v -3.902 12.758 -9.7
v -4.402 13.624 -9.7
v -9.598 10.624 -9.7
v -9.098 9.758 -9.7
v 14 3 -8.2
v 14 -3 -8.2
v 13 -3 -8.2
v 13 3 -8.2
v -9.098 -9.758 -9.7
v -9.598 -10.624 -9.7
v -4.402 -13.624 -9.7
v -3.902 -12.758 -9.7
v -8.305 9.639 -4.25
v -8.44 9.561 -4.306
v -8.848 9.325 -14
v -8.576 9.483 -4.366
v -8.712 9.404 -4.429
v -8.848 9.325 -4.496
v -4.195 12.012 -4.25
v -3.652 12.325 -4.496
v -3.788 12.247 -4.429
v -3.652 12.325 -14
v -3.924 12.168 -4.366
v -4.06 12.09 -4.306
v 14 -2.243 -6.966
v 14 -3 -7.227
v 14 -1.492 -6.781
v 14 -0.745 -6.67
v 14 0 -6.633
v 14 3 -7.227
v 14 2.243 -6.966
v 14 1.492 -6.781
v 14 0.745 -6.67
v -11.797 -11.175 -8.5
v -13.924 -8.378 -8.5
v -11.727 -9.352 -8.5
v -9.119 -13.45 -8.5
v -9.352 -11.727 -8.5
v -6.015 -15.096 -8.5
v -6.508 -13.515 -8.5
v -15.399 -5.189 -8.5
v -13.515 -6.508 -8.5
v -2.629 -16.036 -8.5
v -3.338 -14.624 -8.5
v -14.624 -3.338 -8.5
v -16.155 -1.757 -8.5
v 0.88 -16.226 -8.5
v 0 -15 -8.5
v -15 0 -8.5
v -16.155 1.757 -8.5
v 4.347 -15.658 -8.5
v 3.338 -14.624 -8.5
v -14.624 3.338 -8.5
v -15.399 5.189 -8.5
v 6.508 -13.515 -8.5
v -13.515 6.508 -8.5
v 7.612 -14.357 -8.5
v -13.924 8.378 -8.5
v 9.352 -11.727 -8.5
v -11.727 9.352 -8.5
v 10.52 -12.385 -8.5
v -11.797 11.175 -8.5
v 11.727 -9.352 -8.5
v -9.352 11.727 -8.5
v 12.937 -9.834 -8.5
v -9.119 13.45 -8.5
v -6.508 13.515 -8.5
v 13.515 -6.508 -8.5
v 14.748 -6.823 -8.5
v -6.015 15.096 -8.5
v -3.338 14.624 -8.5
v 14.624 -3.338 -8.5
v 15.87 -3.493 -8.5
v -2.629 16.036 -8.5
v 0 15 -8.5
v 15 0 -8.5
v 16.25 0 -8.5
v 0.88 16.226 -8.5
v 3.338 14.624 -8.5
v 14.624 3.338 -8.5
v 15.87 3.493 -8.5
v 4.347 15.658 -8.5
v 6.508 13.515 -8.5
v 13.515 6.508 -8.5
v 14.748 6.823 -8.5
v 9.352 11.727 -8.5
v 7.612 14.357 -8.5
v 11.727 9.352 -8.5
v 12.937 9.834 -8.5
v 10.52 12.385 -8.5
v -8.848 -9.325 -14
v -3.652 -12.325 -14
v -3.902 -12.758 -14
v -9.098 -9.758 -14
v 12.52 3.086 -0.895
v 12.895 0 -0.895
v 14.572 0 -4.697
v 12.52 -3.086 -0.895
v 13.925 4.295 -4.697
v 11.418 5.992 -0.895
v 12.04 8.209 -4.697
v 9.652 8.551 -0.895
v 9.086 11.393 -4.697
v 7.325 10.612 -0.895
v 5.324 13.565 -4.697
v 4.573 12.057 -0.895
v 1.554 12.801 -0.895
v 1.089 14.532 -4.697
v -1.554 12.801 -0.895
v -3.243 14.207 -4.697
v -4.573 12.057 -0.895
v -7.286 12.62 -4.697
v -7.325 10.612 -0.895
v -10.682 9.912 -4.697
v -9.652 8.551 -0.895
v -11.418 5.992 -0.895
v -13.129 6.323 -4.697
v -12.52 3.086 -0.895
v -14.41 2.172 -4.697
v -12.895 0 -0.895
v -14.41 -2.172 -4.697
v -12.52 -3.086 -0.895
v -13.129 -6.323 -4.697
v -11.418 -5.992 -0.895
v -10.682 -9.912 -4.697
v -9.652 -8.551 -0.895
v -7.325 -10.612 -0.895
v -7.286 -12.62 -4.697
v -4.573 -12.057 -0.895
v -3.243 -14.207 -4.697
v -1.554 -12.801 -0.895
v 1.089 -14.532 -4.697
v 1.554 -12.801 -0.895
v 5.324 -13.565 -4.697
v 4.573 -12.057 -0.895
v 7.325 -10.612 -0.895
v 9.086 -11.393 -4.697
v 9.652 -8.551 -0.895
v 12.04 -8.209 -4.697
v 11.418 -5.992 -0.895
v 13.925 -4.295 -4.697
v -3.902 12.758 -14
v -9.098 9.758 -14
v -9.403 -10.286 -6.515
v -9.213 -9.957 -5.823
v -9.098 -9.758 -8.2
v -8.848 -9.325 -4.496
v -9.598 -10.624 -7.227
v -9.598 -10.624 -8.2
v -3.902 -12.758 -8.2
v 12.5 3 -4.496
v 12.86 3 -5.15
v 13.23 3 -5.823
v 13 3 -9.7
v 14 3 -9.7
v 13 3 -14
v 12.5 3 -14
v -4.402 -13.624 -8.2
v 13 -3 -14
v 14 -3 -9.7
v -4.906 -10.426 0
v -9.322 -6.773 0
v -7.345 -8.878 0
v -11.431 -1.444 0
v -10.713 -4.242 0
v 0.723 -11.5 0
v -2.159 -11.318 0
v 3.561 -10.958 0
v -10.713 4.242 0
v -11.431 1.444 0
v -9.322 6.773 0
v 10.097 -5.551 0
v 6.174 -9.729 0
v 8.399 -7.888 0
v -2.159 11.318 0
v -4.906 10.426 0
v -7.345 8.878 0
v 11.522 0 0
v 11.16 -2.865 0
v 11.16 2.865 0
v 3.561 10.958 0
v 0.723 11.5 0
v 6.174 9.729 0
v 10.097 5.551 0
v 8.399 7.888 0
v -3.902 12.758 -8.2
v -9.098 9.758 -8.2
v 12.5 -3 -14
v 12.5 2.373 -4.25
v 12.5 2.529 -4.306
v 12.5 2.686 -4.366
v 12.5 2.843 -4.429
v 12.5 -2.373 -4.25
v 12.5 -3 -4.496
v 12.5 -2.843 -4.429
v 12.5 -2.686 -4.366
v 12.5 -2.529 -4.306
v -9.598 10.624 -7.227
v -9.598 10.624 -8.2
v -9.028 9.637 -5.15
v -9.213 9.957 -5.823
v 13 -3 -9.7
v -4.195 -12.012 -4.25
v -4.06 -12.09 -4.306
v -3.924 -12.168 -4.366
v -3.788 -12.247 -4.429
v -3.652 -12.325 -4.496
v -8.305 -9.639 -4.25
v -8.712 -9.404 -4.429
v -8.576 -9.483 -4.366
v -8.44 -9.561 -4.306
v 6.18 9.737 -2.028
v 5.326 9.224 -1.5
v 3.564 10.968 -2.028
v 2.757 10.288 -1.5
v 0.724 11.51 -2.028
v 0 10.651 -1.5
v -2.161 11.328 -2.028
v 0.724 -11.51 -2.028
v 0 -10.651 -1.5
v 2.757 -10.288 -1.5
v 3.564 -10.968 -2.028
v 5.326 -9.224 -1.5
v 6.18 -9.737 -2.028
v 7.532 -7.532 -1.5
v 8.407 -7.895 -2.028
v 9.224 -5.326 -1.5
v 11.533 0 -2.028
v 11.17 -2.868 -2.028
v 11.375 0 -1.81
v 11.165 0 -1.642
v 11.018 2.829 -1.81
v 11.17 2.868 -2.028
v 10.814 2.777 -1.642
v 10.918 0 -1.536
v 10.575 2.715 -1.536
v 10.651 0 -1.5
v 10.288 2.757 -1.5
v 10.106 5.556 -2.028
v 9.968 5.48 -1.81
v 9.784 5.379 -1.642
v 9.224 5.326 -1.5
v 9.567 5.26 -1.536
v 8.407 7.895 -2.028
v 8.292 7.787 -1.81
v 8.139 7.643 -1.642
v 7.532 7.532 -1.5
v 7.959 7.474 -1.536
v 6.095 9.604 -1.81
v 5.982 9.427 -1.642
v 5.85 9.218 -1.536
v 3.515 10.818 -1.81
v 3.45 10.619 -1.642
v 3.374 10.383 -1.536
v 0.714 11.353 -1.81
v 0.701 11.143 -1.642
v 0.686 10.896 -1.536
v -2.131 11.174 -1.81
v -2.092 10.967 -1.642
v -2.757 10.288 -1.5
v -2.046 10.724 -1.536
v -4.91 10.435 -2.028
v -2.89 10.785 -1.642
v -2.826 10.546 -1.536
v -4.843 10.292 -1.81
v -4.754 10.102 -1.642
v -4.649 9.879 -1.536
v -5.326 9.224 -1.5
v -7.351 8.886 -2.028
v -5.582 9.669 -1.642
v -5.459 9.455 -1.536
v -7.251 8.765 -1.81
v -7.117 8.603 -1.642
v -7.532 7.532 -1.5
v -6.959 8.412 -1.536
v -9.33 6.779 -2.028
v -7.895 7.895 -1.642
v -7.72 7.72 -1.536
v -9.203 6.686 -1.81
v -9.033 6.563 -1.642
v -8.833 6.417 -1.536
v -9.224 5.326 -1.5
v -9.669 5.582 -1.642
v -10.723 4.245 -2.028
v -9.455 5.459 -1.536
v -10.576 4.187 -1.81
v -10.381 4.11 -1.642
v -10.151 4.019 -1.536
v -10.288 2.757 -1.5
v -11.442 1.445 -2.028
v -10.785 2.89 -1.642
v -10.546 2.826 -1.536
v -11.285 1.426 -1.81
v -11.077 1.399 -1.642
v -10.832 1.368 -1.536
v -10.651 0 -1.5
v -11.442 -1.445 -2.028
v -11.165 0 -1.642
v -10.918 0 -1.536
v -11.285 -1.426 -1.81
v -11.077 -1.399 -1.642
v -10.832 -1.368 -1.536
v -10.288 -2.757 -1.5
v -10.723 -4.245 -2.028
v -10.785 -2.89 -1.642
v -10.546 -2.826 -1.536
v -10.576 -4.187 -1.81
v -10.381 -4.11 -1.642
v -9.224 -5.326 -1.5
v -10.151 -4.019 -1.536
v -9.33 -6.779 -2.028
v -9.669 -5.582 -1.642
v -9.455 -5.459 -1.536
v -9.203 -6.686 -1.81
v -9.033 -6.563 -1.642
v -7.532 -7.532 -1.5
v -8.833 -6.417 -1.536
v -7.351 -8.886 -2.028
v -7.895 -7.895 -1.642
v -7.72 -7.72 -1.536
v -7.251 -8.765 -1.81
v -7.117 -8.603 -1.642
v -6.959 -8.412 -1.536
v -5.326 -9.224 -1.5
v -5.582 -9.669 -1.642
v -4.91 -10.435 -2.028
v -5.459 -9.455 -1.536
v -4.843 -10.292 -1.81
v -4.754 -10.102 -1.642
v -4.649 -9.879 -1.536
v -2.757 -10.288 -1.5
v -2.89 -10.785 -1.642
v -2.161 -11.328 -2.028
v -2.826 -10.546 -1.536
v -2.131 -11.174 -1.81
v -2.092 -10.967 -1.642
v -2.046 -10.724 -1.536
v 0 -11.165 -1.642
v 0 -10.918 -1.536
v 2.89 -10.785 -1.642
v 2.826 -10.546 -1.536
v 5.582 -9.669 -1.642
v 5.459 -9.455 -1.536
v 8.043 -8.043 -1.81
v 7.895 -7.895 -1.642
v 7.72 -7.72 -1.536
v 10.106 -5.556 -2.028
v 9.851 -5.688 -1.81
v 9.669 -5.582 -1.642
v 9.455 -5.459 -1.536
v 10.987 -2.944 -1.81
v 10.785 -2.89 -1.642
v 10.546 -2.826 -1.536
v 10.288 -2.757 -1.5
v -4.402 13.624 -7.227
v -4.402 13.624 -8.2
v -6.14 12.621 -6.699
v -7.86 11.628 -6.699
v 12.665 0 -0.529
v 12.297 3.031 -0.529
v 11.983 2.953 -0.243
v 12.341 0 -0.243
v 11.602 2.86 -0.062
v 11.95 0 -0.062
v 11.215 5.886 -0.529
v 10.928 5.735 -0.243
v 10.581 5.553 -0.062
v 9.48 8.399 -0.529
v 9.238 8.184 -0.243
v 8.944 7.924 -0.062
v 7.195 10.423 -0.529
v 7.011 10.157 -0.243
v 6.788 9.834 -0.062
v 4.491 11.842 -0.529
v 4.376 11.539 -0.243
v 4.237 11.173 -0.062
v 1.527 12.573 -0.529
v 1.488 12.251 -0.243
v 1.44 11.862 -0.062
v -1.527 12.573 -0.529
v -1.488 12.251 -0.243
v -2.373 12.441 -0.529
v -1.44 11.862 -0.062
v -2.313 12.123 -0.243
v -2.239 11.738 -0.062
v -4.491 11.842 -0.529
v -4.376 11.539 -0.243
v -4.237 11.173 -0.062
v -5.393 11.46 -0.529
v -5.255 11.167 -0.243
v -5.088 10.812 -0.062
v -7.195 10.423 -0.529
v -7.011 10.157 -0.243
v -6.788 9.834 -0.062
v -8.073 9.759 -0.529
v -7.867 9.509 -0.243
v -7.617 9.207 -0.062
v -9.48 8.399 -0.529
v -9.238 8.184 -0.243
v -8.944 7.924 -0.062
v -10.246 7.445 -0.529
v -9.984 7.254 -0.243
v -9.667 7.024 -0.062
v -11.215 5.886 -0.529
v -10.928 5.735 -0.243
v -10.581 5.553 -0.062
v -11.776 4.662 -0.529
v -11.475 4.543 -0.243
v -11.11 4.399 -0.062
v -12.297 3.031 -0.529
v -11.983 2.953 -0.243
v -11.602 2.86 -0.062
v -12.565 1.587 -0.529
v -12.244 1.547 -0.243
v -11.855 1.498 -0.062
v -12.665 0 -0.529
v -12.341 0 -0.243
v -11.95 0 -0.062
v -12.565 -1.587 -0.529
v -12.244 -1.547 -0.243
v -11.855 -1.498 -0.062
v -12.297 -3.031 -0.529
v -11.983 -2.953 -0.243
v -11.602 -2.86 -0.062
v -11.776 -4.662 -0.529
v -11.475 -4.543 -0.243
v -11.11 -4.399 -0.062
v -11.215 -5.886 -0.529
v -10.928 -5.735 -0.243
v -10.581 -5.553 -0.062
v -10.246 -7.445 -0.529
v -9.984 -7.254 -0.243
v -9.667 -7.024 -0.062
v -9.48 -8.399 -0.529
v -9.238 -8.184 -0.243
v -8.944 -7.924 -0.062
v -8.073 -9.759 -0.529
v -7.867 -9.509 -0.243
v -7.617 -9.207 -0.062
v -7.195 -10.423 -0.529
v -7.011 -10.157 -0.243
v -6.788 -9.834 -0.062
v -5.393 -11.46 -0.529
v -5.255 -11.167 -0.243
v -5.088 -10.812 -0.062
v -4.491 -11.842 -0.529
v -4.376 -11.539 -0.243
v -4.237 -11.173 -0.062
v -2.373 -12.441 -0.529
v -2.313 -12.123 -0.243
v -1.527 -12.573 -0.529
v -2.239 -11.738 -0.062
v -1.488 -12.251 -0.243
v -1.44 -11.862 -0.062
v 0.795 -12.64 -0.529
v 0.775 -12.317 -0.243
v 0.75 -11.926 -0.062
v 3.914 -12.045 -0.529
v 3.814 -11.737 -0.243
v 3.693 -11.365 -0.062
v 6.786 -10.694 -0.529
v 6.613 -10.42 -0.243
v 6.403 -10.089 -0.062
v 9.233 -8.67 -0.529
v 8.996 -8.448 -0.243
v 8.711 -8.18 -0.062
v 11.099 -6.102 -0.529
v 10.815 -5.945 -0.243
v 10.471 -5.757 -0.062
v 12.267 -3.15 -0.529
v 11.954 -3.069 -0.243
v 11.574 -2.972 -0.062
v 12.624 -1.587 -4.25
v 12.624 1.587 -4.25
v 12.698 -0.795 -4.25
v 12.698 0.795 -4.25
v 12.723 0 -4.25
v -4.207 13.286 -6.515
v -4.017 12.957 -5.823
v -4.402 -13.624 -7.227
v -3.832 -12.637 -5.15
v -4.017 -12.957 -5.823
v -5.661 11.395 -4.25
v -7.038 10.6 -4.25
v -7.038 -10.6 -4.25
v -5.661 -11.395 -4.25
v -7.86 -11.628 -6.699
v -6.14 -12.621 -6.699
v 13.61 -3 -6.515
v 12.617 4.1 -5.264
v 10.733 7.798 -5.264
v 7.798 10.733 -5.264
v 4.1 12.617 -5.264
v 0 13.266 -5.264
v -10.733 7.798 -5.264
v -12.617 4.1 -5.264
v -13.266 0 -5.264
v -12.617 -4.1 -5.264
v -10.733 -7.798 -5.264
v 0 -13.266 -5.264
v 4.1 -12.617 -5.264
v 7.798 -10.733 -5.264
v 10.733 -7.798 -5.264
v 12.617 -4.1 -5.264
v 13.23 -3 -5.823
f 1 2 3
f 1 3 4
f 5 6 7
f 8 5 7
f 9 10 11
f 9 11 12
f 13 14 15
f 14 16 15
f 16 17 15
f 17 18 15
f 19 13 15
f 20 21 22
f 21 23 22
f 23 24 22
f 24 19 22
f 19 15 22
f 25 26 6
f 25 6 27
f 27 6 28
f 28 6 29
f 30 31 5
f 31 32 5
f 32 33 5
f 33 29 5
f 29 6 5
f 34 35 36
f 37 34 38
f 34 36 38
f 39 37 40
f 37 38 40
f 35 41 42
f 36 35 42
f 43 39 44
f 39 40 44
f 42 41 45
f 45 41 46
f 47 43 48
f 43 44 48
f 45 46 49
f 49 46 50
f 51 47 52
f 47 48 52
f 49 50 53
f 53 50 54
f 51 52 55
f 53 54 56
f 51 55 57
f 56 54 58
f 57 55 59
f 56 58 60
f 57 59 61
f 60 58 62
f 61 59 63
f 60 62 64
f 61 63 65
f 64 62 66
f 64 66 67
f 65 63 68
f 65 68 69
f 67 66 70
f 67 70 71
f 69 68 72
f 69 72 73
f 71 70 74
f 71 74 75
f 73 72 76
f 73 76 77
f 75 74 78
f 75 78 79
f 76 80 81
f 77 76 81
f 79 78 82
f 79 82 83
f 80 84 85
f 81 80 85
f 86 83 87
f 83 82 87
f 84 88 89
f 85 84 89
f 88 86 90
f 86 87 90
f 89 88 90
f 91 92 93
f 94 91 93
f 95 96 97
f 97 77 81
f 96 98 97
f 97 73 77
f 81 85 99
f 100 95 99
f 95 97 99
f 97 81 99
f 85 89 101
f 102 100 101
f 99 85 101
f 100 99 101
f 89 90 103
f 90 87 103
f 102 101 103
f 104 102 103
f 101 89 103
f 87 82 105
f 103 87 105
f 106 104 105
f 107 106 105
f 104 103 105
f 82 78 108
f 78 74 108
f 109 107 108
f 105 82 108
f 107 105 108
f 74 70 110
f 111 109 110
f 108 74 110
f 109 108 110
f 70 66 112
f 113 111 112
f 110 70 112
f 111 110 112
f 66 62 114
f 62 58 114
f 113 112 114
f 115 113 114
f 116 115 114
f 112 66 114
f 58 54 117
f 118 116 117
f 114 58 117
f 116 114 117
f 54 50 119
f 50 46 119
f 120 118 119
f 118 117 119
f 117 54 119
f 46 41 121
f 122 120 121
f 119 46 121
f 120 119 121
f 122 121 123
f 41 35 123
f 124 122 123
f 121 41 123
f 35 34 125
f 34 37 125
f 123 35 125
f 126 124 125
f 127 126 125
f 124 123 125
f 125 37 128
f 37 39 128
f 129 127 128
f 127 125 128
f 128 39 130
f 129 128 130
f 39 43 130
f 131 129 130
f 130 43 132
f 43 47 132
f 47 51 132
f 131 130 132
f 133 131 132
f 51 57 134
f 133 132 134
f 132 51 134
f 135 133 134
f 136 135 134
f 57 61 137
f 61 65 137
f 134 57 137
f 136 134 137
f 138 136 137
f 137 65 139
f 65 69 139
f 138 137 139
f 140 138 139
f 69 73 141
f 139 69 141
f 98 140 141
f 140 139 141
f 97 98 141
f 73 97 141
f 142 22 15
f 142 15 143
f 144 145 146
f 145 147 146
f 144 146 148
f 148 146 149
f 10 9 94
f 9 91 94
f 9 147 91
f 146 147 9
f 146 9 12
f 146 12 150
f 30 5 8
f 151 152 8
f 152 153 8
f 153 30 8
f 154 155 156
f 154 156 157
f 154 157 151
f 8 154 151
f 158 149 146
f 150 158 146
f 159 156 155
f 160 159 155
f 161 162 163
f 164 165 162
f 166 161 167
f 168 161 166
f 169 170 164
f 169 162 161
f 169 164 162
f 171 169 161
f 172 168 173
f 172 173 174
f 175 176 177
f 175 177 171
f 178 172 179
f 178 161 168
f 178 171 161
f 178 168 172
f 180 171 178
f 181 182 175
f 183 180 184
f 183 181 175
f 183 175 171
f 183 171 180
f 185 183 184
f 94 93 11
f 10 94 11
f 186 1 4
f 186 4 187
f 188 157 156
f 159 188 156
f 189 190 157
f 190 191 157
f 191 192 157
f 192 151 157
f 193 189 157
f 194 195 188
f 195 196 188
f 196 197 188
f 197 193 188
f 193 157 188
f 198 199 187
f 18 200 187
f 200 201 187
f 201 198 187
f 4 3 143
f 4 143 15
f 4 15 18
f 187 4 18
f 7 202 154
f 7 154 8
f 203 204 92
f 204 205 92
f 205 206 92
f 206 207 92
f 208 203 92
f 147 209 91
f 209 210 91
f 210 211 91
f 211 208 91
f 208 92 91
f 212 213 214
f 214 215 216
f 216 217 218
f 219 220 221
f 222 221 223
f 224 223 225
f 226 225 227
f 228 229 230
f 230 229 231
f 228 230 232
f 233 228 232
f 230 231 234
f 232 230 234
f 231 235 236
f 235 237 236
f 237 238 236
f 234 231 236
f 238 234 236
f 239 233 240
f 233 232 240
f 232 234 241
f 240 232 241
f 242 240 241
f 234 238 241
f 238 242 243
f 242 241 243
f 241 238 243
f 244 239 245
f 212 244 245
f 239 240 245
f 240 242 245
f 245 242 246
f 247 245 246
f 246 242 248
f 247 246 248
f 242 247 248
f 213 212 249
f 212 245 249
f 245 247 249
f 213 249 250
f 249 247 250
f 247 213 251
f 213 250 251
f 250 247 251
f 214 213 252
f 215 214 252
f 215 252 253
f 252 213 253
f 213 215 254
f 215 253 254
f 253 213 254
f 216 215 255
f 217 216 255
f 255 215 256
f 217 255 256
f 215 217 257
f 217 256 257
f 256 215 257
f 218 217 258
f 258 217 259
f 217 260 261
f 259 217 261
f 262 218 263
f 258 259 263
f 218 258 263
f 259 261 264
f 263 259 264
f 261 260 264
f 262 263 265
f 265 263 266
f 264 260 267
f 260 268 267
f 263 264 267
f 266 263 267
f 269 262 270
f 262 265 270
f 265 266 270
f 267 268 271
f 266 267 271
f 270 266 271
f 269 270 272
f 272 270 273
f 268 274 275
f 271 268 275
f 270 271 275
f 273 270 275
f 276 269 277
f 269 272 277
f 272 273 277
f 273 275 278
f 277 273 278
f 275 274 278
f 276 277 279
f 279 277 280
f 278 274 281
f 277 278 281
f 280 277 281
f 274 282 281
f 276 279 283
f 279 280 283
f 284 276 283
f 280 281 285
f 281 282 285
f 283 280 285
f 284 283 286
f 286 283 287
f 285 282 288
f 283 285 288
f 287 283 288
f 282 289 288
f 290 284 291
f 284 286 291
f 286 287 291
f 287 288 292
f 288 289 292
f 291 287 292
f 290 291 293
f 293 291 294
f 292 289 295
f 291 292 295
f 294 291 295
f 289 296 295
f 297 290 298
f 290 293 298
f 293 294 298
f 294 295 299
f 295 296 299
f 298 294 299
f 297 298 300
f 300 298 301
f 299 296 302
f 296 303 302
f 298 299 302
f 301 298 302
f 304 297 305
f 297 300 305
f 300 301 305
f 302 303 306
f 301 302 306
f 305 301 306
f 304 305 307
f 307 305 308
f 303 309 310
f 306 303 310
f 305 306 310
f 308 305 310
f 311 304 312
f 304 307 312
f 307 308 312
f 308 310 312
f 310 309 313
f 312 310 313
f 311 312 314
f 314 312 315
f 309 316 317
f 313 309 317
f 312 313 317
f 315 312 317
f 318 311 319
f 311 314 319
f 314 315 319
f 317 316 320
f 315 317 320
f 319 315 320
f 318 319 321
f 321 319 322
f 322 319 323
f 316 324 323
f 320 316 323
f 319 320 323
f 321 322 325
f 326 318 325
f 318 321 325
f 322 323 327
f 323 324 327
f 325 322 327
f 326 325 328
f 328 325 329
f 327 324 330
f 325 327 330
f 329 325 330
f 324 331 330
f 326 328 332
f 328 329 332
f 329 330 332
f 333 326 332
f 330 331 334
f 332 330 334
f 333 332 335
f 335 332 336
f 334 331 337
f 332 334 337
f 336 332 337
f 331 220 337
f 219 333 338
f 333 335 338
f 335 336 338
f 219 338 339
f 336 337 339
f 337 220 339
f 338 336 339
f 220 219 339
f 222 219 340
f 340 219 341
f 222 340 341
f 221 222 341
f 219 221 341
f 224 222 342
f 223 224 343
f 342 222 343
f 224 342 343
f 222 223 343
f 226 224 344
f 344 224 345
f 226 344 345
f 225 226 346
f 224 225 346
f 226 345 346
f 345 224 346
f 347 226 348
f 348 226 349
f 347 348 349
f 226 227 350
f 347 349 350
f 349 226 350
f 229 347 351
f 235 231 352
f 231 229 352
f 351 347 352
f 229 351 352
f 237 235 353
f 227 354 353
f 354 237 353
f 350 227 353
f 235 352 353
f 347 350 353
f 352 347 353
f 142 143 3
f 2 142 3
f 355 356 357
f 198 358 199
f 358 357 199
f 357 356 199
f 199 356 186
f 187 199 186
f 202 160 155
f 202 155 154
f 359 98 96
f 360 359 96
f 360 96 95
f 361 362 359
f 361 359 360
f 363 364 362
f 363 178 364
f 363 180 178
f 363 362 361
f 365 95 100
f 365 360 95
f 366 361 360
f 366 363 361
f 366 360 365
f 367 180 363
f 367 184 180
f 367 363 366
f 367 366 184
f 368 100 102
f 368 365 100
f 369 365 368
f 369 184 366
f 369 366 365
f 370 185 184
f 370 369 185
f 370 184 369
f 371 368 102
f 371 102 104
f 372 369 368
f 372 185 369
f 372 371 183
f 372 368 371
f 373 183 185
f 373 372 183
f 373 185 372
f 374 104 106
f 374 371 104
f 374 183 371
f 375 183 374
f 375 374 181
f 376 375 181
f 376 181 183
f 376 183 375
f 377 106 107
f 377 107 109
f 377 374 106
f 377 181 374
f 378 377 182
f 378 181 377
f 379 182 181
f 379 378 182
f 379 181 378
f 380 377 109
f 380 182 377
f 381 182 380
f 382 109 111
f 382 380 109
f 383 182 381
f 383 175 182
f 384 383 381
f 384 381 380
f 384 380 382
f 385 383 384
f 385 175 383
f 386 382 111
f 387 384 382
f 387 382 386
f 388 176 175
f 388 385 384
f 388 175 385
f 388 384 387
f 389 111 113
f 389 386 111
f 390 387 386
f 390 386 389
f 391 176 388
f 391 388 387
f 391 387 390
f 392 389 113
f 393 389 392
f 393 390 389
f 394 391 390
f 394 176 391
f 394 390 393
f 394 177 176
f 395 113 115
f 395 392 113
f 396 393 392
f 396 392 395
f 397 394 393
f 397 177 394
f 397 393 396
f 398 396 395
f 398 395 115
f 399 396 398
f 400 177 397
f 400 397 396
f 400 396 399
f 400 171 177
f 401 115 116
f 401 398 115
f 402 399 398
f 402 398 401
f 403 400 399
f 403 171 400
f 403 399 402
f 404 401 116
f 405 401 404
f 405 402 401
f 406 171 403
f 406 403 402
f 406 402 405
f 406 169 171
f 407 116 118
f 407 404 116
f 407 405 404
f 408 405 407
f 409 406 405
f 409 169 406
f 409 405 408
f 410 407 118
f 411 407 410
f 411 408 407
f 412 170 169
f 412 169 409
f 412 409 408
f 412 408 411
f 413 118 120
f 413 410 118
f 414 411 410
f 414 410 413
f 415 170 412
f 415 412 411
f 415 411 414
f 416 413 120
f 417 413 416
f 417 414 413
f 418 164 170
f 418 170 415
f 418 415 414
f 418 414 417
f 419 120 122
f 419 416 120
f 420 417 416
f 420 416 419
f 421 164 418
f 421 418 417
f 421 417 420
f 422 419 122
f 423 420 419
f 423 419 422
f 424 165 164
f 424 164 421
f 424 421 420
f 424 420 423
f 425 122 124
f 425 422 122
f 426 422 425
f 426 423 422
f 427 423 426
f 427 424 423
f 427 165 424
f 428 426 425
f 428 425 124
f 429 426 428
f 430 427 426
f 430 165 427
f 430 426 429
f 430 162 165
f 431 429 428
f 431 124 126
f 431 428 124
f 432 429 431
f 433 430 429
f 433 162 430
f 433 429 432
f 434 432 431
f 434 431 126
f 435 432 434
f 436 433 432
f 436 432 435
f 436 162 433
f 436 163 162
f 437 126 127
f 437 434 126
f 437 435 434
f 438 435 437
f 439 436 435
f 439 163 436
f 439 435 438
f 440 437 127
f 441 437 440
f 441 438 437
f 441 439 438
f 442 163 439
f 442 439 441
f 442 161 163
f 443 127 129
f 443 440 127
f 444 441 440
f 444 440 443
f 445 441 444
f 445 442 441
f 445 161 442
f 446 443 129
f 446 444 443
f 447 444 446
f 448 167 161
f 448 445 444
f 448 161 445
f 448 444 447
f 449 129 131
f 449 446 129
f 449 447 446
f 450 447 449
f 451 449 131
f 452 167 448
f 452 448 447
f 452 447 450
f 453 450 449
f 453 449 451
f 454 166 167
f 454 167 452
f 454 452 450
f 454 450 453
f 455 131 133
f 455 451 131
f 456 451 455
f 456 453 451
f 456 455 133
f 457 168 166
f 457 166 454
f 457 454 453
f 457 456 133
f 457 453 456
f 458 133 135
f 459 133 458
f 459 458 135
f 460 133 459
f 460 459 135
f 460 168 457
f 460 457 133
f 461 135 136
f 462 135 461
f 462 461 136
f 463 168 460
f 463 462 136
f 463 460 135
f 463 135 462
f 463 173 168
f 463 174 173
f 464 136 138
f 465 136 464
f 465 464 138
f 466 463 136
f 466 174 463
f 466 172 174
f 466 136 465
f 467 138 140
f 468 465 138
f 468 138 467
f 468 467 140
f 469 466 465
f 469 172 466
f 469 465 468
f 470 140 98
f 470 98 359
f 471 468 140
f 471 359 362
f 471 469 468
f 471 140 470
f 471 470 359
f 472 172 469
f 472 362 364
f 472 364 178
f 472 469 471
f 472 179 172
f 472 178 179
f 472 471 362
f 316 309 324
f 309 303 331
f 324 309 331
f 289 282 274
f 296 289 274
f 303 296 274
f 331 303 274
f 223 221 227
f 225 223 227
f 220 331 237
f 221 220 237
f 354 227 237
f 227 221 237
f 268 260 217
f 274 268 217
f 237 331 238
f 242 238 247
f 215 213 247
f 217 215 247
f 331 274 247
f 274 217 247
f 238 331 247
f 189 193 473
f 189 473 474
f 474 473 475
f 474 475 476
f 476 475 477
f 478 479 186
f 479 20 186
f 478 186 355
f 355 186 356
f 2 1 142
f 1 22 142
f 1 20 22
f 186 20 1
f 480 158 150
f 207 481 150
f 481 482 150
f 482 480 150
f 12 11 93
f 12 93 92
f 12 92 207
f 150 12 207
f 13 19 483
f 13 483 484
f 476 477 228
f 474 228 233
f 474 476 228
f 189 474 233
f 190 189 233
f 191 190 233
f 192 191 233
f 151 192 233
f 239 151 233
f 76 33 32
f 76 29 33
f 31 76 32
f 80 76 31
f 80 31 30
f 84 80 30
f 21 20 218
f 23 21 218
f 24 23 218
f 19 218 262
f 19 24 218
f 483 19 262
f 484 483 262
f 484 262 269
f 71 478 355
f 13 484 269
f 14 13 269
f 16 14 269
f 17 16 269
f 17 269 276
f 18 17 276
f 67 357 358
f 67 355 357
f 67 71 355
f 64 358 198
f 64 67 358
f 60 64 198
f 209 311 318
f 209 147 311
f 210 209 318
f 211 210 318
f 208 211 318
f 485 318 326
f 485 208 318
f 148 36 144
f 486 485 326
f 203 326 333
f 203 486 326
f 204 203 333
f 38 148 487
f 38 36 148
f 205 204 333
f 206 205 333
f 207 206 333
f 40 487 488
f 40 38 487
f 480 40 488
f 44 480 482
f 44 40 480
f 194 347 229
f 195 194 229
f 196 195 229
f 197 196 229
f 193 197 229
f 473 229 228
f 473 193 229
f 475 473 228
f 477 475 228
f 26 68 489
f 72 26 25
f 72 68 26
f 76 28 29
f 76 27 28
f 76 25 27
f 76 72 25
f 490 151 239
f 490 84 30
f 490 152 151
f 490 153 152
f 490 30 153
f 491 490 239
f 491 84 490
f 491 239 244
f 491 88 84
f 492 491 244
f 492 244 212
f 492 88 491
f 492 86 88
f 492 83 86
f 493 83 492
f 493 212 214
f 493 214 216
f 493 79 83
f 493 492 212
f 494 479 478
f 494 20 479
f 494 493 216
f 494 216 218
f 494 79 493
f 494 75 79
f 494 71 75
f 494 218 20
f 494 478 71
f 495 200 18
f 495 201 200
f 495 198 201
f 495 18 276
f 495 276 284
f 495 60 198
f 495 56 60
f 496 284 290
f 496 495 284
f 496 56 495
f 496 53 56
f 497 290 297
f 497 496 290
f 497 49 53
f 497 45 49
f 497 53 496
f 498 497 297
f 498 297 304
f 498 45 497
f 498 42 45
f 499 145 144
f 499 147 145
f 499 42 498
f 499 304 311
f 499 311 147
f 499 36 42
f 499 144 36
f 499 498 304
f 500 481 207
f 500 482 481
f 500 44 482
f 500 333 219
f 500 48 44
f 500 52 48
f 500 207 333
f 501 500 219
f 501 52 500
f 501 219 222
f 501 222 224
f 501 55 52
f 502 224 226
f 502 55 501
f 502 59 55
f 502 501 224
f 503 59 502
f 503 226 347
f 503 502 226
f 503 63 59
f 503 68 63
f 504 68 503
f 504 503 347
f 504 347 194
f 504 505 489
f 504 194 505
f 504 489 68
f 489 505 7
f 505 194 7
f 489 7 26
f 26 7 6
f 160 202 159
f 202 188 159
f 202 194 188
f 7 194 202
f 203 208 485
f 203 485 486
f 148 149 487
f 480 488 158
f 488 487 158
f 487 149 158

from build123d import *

# Parameters (mm, degrees)
TOP_R              = 12.5
MIDDLE_R           = 16.25
INSIDE_TOP_R       = 11.25
INSIDE_BOTTOM_R    = 15
ZAOKR_GLENIE1_R    = 1
ZAOKR_GLENIE2_R    = 1.5
LATCH_START        = -9
LATCH_DEPTH        = 9.75
LATCH_CUTOUT_DEPTH = 6
SZYK_KO_OWY2_COUNT = 3


with BuildPart() as part:
    # top → outside section 0
    with BuildSketch(Plane.XY):
        Circle(TOP_R)
    # middle → outside section 1
    with BuildSketch(Plane.XY.offset(-8.5)):
        Circle(MIDDLE_R)
    loft()

    # inside-top → inside-cutout section 0
    with BuildSketch(Plane.XY.offset(-1.5)):
        Circle(INSIDE_TOP_R)
    # inside-bottom → inside-cutout section 1
    with BuildSketch(Plane.XY.offset(-8.5)):
        Circle(INSIDE_BOTTOM_R)
    loft(mode=Mode.SUBTRACT)

    # Zaokrąglenie1
    zaokr_glenie1_edges = [part.edges().sort_by_distance(p)[0] for p in [
        (-11.25, 0, -1.5),
    ]]
    fillet(zaokr_glenie1_edges, radius=ZAOKR_GLENIE1_R)

    # Zaokrąglenie2
    zaokr_glenie2_edges = [part.edges().sort_by_distance(p)[0] for p in [
        (-12.5, 0, 0),
    ]]
    fillet(zaokr_glenie2_edges, radius=ZAOKR_GLENIE2_R)

    # Szkic6 → latch (add)
    with BuildSketch(Plane.XY.offset(-5).offset(LATCH_START)):
        Polygon((12.5, 0), (12.5, -3), (14, -3), (14, 3), (12.5, 3), align=None)
    latch = extrude(amount=LATCH_DEPTH)

    # Szkic → latch-cutout (cut)
    with BuildSketch(Plane(origin=(0, -3, 0), x_dir=(-1, 0, 0), z_dir=(0, -1, 0))):
        Polygon((-14, 9.7), (-13, 9.7), (-13, 8.2), (-14, 8.2), (-14.5, 8.2), (-14.5, 14), (-14, 14), (-13, 14), align=None)
    latch_cutout = extrude(amount=-LATCH_CUTOUT_DEPTH, mode=Mode.SUBTRACT)

    # Szyk kołowy2: latch, latch-cutout ×3 about axis
    szyk_ko_owy2_axis = Axis((0, 0, 0), (0, 0, 1))
    add([latch.rotate(szyk_ko_owy2_axis, i * 360 / SZYK_KO_OWY2_COUNT) for i in range(1, SZYK_KO_OWY2_COUNT)])
    add([latch_cutout.rotate(szyk_ko_owy2_axis, i * 360 / SZYK_KO_OWY2_COUNT) for i in range(1, SZYK_KO_OWY2_COUNT)], mode=Mode.SUBTRACT)


solid = part.part
